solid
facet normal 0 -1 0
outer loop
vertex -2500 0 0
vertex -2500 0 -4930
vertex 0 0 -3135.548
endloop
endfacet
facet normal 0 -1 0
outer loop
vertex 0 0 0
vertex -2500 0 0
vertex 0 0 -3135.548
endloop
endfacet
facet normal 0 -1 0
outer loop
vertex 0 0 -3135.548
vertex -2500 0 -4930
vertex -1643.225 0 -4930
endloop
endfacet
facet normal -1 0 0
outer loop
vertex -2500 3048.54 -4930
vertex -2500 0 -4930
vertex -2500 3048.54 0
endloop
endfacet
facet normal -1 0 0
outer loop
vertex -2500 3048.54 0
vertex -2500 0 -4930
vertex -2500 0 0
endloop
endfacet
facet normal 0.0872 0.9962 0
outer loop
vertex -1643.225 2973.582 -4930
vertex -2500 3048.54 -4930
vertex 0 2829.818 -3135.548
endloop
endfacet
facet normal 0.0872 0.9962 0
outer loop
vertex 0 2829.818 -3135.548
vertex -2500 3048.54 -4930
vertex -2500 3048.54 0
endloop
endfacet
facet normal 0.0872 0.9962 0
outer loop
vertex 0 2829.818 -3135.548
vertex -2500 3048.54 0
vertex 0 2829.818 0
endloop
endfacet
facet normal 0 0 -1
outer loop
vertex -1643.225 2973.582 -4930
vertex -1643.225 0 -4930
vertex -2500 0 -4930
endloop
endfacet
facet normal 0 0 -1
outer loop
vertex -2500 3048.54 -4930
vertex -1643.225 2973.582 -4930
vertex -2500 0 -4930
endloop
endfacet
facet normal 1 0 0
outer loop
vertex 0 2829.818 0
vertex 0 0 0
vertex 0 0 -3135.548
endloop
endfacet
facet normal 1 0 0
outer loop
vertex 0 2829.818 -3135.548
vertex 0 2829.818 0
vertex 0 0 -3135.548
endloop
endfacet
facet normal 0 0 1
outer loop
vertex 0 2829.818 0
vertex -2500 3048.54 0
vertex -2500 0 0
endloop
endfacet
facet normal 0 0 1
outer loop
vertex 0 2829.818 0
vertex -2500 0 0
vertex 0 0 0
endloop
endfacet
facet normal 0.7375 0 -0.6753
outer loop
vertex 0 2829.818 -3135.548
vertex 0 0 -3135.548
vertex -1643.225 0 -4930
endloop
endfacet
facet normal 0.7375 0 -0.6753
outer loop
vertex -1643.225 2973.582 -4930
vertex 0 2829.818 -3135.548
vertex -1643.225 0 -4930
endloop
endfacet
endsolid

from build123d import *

# Parameters (mm, degrees)
AUFSATZ_LINEAR_AUSTRAGEN1_DEPTH = 3048.54
SCHNITT_LINEAR_AUSTRAGEN1_DEPTH = 4931


with BuildPart() as part:
    # Skizze1 → Aufsatz-Linear austragen1 (new body)
    with BuildSketch(Plane(origin=(0, 0, 0), x_dir=(1, 0, 0), z_dir=(0, 1, 0))):
        Polygon((-2500, 4930), (-2500, 0), (0, 0), (0, 3135.547559896), (-1643.224828015, 4930), align=None)
    extrude(amount=AUFSATZ_LINEAR_AUSTRAGEN1_DEPTH)

    # Skizze2 → Schnitt-Linear austragen1 (cut, through all)
    with BuildSketch(Plane.XY):
        Polygon((-2500, 3048.54), (0, 2829.818341185), (0, 3048.54), align=None)
    extrude(amount=-SCHNITT_LINEAR_AUSTRAGEN1_DEPTH, mode=Mode.SUBTRACT)


solid = part.part
